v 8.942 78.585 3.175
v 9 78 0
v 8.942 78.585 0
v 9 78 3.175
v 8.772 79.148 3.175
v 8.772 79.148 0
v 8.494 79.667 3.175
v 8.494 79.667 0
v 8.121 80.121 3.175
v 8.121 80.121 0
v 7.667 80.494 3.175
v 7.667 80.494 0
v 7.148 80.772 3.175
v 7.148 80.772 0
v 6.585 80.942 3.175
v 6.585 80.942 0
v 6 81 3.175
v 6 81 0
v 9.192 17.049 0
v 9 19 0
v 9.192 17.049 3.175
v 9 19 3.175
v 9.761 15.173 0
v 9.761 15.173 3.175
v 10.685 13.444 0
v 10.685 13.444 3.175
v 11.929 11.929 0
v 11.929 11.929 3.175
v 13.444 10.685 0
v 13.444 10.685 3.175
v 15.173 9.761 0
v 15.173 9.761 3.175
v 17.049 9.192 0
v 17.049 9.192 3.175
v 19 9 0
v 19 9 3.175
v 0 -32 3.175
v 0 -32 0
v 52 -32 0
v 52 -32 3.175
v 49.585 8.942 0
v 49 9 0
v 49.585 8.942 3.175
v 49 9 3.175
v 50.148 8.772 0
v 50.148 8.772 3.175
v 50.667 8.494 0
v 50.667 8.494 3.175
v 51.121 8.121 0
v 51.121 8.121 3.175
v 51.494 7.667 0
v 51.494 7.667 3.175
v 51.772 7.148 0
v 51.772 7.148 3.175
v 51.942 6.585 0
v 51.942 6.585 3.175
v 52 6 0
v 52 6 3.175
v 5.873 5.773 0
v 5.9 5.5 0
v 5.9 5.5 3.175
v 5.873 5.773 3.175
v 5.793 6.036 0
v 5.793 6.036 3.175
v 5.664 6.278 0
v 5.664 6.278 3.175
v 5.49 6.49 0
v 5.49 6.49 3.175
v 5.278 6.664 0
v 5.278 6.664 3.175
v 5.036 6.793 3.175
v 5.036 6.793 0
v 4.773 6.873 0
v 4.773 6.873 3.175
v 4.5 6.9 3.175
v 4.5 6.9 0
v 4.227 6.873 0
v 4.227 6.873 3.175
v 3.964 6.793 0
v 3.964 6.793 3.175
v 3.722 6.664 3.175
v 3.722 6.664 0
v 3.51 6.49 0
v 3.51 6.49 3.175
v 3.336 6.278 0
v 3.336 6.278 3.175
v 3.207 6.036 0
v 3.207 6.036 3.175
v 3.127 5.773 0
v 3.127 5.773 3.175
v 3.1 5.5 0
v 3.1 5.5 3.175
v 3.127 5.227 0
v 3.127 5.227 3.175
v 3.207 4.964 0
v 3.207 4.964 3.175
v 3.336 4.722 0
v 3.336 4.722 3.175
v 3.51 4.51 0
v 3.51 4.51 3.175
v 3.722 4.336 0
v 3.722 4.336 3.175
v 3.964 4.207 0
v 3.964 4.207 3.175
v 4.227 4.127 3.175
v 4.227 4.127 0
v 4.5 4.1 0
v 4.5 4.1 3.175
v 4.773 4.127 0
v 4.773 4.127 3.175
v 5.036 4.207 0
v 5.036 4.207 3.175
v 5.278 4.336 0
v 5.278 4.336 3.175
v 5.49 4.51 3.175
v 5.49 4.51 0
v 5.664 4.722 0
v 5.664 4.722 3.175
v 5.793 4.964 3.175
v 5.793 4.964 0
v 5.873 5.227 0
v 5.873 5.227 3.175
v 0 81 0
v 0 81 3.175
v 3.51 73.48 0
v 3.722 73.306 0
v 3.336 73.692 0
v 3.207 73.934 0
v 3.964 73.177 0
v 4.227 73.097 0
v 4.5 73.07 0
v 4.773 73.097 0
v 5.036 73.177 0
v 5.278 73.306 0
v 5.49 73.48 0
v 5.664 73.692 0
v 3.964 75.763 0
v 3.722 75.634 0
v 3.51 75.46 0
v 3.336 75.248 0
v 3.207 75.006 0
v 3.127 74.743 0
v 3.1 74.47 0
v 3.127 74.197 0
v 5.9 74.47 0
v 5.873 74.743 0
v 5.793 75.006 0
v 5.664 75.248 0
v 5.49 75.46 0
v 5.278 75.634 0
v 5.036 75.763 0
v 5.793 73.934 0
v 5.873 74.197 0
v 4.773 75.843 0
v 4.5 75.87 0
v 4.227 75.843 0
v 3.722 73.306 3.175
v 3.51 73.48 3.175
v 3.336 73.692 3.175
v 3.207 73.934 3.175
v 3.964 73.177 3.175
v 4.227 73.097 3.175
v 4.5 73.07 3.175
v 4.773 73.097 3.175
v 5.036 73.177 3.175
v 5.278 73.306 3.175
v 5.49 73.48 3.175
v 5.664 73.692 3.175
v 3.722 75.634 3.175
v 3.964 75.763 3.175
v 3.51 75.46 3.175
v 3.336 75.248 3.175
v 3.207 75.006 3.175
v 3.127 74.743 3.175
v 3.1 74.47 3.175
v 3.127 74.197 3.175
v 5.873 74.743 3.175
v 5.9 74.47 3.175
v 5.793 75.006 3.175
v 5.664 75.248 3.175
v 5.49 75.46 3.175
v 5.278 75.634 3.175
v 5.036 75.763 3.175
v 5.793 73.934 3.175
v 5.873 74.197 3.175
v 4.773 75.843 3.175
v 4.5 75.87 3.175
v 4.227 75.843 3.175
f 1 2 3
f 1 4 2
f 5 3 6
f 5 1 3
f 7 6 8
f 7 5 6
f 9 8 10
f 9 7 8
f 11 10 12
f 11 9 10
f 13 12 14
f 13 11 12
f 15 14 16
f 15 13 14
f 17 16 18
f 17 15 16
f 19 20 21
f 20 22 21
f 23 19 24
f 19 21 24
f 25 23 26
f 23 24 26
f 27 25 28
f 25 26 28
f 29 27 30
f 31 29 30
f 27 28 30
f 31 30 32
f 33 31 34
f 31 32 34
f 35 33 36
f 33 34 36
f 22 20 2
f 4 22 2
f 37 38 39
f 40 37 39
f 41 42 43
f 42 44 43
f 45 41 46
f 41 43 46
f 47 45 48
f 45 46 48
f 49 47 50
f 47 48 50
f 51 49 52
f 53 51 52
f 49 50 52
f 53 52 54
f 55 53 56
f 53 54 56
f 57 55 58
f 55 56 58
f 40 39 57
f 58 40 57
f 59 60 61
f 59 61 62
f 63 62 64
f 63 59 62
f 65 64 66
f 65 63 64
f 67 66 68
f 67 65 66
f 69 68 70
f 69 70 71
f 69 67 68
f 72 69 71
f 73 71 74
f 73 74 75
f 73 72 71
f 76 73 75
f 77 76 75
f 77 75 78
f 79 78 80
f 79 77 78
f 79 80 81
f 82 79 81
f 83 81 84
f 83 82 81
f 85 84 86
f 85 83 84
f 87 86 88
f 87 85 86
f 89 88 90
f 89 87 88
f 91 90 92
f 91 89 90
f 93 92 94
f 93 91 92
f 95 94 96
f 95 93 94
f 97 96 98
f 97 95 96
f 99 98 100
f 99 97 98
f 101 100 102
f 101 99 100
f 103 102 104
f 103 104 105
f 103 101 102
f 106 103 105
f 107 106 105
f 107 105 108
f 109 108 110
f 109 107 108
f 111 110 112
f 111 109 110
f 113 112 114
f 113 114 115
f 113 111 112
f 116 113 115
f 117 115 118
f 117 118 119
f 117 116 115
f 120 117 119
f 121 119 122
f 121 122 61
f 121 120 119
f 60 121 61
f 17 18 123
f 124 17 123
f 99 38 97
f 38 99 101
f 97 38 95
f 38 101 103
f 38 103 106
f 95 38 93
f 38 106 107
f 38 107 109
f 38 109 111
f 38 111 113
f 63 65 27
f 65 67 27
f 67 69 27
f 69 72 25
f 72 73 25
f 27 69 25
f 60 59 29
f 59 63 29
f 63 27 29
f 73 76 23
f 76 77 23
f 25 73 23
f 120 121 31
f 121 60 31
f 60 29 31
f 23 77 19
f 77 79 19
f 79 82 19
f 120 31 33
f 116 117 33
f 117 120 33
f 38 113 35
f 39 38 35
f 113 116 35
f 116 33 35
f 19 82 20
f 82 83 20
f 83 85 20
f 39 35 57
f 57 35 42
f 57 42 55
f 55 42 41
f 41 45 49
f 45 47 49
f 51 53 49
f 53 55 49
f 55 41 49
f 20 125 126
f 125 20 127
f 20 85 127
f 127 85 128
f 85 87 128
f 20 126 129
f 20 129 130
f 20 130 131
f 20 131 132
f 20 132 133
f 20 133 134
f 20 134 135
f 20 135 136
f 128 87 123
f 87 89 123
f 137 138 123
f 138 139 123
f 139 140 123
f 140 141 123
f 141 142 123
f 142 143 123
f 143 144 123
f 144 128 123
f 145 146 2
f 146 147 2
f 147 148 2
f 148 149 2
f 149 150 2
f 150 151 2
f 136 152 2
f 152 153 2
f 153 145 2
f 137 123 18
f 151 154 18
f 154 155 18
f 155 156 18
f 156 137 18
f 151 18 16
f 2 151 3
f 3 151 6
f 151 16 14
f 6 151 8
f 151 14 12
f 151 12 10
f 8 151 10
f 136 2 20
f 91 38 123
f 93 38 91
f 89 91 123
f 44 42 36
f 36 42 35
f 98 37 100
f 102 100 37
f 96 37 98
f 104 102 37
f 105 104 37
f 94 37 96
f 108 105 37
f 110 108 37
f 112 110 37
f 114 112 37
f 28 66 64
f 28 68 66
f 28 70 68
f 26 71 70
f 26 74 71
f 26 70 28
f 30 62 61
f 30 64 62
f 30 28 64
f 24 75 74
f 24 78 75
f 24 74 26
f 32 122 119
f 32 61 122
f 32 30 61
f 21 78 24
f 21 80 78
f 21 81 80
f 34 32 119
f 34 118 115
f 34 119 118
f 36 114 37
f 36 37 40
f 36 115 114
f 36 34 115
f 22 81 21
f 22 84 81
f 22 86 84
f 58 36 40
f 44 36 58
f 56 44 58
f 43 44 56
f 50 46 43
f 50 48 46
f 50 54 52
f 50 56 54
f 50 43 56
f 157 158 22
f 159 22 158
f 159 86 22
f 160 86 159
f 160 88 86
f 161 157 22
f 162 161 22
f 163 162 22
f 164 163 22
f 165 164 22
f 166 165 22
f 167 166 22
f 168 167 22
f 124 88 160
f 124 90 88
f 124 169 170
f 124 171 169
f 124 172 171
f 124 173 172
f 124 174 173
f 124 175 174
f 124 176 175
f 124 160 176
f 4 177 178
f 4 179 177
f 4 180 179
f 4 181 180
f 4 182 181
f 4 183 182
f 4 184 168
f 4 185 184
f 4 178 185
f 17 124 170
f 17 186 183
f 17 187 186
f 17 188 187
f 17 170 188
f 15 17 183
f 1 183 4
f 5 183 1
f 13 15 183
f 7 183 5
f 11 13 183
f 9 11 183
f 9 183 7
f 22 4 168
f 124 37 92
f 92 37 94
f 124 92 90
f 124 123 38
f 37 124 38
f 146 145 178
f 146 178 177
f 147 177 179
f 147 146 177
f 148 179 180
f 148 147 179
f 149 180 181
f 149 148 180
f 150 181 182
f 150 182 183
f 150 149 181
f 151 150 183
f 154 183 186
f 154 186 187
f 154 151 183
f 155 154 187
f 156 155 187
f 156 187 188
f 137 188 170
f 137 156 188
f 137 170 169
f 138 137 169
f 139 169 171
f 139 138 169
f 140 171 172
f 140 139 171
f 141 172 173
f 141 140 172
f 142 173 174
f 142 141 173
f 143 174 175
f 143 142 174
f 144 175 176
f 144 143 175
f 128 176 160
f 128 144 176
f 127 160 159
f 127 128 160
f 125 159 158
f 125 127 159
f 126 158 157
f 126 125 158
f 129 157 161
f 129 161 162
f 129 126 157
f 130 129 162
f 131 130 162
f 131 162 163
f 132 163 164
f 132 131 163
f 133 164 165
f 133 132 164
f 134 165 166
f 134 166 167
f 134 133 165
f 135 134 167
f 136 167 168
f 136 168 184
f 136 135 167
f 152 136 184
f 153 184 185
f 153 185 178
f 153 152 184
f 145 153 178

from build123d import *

# Parameters (mm, degrees)
SKETCH1_R           = 1.4
BOSS_EXTRUDE1_DEPTH = 3.175
FILLET1_R           = 10
FILLET2_R           = 3


with BuildPart() as part:
    # Sketch1 → Boss-Extrude1 (new body)
    with BuildSketch(Plane.XY):
        Polygon((9, 9), (9, 81), (0, 81), (0, -32), (52, -32), (52, 9), align=None)
        with Locations((4.5, 5.5)):
            Circle(SKETCH1_R, mode=Mode.SUBTRACT)
        with Locations((4.5, 74.47)):
            Circle(SKETCH1_R, mode=Mode.SUBTRACT)
    extrude(amount=BOSS_EXTRUDE1_DEPTH)

    # Fillet1
    fillet1_edges = [part.edges().sort_by_distance(p)[0] for p in [
        (9, 9, 1.5875),
    ]]
    fillet(fillet1_edges, radius=FILLET1_R)

    # Fillet2
    fillet2_edges = [part.edges().sort_by_distance(p)[0] for p in [
        (9, 81, 1.5875),
        (52, 9, 1.5875),
    ]]
    fillet(fillet2_edges, radius=FILLET2_R)


solid = part.part
